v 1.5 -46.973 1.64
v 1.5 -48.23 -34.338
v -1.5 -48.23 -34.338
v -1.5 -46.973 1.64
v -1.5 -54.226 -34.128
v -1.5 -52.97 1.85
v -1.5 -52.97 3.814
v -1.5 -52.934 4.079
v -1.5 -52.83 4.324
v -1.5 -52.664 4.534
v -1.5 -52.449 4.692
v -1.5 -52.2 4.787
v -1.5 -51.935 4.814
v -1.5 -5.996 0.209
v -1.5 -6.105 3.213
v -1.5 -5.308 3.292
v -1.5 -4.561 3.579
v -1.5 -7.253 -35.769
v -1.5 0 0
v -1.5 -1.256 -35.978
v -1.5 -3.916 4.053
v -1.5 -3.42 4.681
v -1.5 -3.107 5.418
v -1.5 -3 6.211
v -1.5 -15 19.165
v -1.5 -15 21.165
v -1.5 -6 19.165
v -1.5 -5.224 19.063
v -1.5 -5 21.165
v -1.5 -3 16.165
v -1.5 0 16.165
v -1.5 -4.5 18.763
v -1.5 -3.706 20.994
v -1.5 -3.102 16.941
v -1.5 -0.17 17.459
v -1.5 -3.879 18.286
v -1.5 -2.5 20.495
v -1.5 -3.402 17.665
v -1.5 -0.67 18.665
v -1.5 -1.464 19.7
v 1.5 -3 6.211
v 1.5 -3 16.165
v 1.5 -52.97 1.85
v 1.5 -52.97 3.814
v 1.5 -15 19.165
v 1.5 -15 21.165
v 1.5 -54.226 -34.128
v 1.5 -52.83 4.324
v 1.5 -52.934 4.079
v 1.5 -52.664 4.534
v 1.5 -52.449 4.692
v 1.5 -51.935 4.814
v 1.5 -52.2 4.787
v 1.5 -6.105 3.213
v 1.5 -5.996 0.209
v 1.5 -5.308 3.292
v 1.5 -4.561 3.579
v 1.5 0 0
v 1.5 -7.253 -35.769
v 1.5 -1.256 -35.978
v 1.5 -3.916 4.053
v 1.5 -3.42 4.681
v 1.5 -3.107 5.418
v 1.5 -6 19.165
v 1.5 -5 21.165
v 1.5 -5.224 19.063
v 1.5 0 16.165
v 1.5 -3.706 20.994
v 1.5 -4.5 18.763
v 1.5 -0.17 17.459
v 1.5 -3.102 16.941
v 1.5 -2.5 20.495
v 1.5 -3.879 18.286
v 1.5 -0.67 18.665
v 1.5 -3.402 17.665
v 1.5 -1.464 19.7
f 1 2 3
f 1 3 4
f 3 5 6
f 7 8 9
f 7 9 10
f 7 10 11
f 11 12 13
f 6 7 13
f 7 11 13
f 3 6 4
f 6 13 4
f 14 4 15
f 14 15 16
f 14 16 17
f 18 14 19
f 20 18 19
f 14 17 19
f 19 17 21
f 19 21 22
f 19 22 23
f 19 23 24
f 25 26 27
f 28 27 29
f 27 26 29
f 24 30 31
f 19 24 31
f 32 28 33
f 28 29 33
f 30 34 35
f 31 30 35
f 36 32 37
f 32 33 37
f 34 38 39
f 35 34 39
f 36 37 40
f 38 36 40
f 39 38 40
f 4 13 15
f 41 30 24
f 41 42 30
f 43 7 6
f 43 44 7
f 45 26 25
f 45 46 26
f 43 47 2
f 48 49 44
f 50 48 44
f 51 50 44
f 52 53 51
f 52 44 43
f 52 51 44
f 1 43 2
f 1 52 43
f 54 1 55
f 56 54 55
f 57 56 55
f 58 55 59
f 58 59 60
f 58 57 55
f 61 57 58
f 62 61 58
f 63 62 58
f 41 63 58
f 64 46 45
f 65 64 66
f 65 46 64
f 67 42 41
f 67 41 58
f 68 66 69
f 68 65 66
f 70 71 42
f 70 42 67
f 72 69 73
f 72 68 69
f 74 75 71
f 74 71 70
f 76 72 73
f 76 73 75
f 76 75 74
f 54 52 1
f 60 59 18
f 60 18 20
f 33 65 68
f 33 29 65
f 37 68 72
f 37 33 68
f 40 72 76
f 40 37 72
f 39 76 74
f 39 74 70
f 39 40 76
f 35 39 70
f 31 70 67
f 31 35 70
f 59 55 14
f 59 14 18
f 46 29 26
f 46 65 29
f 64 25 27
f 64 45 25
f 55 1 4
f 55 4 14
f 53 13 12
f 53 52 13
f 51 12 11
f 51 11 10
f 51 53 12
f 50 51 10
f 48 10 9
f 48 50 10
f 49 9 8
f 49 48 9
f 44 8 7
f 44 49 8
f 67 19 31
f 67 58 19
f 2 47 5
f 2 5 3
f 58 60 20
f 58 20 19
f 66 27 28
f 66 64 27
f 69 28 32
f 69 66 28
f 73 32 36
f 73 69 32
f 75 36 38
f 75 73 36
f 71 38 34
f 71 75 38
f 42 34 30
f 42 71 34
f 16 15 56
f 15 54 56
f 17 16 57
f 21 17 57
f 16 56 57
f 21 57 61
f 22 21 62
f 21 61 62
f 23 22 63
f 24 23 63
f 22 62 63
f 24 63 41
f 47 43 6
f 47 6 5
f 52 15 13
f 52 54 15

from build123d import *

# Parameters (mm, degrees)
F1_DEPTH = 1.5
F2_R     = 3
F3_R     = 1
F4_R     = 5


with BuildPart() as f1:
    # F0 (on Right) → F1 (new body, symmetric)
    with BuildSketch(Plane.YZ):
        Polygon((-15, 19.164762), (-3, 19.164762), (-3, 3.104762), (-52.969541, 4.849737), (-52.969541, 1.849737), (-46.973196, 1.64034), (-5.996345, 0.209397), (0, 0), (0, 21.164762), (-15, 21.164762), align=None)
        Polygon((-1.256382, -35.97807), (0, 0), (-5.996345, 0.209397), (-7.252727, -35.768673), align=None)
        Polygon((-46.973196, 1.64034), (-52.969541, 1.849737), (-54.225923, -34.128333), (-48.229578, -34.33773), align=None)
    extrude(amount=F1_DEPTH, both=True)

    # F2
    f2_edges = [f1.edges().sort_by_distance(p)[0] for p in [
        (0, -3, 19.164762),
        (0, -3, 3.104762),
    ]]
    fillet(f2_edges, radius=F2_R)

    # F3
    f3_edges = [f1.edges().sort_by_distance(p)[0] for p in [
        (0, -52.969541, 4.849737),
    ]]
    fillet(f3_edges, radius=F3_R)

    # F4
    f4_edges = [f1.edges().sort_by_distance(p)[0] for p in [
        (0, 0, 21.164762),
    ]]
    fillet(f4_edges, radius=F4_R)


solid = f1.part
